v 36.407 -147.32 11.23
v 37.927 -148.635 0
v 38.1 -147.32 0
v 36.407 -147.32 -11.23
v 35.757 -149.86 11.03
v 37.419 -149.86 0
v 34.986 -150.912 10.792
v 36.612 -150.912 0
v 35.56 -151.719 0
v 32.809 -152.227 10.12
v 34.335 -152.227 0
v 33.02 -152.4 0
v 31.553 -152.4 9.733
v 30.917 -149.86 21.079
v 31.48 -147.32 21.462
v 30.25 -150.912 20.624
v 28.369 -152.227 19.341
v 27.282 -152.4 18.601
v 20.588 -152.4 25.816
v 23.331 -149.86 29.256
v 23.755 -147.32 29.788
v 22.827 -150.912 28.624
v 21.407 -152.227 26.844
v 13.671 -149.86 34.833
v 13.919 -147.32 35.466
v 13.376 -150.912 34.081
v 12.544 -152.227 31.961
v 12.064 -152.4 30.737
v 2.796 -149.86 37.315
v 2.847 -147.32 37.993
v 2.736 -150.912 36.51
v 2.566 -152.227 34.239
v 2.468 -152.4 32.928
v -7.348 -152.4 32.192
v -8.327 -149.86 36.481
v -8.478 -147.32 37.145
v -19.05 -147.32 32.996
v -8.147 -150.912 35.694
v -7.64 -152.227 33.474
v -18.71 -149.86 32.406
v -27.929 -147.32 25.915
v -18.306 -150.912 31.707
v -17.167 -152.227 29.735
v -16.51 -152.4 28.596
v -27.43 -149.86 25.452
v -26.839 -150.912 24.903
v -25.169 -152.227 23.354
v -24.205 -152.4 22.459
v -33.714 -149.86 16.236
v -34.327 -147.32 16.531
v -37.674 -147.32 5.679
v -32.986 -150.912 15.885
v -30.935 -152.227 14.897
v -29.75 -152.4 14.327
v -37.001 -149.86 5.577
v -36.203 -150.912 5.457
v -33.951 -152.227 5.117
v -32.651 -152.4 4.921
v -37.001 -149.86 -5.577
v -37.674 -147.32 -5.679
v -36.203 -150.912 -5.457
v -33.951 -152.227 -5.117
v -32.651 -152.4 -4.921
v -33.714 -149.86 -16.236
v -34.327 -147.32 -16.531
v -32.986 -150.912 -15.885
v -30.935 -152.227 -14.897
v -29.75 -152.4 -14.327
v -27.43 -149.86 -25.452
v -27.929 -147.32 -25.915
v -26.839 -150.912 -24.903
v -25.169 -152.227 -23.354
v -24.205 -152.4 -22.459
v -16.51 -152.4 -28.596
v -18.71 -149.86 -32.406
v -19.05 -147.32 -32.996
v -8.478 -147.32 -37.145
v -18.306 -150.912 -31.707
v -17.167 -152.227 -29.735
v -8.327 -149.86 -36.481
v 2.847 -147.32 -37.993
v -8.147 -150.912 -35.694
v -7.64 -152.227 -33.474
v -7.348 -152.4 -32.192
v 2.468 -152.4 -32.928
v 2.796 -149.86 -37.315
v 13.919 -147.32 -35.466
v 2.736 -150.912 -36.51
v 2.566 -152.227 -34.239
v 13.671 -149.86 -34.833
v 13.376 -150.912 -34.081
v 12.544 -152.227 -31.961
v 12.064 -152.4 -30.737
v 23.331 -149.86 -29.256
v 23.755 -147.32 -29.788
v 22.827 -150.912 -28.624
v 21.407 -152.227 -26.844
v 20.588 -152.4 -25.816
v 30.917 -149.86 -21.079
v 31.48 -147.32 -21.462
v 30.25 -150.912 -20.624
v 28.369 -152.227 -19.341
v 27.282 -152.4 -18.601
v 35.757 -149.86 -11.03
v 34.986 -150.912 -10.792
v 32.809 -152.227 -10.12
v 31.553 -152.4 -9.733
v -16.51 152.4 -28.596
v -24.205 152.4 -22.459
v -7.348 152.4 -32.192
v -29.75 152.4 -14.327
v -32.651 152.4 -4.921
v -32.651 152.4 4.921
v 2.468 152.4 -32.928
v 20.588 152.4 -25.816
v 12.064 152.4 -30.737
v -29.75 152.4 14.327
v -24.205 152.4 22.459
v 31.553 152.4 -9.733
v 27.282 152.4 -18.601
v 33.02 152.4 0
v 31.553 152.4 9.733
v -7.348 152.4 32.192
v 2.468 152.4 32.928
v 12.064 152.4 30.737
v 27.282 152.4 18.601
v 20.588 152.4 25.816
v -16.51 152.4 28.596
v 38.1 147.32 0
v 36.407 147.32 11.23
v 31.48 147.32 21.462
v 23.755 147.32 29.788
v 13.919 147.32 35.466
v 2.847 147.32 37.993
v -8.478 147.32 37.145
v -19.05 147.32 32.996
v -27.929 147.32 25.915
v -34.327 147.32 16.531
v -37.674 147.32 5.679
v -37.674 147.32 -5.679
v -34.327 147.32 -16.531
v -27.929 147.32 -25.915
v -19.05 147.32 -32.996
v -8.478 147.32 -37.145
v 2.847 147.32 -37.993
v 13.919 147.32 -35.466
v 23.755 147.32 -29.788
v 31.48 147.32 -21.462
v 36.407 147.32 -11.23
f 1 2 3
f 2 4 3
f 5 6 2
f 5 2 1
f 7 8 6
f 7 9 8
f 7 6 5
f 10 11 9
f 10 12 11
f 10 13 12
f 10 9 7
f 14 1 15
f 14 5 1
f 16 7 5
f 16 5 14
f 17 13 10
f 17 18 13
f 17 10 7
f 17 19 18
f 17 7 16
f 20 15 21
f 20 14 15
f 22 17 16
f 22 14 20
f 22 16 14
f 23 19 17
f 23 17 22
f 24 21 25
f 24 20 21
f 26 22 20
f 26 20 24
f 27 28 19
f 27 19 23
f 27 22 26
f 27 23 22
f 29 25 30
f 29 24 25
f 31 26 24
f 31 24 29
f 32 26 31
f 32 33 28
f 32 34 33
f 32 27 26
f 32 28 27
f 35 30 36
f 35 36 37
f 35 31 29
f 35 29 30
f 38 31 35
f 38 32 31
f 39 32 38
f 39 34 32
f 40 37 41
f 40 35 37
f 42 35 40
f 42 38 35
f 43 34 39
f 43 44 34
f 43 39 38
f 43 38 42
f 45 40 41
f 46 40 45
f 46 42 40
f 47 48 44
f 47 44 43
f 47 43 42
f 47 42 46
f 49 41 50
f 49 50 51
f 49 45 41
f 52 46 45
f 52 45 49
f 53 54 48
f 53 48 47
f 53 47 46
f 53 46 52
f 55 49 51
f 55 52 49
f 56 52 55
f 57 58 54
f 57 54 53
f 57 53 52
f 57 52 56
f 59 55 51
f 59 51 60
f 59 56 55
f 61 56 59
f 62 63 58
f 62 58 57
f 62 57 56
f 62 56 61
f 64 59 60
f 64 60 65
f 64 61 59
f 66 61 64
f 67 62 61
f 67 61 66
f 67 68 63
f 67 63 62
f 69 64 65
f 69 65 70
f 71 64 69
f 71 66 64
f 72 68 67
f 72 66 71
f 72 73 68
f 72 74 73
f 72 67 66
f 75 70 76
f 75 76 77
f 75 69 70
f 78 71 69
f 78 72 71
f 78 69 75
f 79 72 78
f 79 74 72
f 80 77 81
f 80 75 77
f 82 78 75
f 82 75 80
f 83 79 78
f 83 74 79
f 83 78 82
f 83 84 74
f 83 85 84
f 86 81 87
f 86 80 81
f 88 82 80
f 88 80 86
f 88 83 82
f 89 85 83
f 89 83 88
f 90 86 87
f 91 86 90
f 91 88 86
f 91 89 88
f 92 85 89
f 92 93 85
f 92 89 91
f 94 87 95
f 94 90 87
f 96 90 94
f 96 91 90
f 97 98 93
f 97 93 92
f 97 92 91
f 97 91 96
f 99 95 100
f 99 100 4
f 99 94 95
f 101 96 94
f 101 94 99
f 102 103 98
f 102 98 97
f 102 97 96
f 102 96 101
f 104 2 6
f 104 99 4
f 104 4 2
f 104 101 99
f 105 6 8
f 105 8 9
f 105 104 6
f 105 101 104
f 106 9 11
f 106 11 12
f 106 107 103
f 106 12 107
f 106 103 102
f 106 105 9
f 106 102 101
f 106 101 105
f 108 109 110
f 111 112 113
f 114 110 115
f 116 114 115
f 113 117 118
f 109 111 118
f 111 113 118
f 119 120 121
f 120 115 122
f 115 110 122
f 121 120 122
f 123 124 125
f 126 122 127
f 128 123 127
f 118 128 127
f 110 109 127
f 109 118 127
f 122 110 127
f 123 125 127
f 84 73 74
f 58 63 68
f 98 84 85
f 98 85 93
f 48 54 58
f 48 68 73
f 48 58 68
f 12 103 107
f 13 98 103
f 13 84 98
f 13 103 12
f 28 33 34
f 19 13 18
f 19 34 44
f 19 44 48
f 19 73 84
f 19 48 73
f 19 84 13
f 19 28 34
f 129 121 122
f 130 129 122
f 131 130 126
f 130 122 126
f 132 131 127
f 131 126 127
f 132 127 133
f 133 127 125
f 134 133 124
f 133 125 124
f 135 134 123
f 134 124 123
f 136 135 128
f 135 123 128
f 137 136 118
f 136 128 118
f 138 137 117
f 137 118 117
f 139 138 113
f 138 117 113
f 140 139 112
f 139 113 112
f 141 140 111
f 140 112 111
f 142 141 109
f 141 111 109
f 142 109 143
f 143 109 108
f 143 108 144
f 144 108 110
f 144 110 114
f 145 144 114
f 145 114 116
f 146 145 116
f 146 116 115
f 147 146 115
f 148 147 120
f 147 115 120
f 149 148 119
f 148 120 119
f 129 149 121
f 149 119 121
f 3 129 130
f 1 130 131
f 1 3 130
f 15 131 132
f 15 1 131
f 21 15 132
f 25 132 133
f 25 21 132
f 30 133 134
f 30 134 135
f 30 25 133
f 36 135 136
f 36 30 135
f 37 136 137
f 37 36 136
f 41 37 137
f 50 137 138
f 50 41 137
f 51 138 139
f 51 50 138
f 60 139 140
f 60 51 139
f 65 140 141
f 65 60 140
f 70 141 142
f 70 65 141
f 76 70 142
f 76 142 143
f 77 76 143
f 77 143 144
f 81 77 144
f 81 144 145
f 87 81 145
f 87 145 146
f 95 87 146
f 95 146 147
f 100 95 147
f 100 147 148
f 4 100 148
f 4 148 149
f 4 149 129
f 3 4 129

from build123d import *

# Parameters (mm, degrees)
F0_R     = 38.1
F1_DEPTH = 152.4
F2_R     = 5.08
F3_SIZE  = 5.08


with BuildPart() as f1:
    # F0 (on Front) → F1 (new body, symmetric)
    with BuildSketch(Plane.XZ):
        Circle(F0_R)
    extrude(amount=F1_DEPTH, both=True)

    # F2
    f2_edges = [f1.edges().sort_by_distance(p)[0] for p in [
        (-38.1, -152.4, 0),
    ]]
    fillet(f2_edges, radius=F2_R)

    # F3
    f3_edges = [f1.edges().sort_by_distance(p)[0] for p in [
        (38.1, 2.54, 0),
        (-38.1, -147.32, 0),
        (-38.1, 152.4, 0),
    ]]
    chamfer(f3_edges, length=F3_SIZE)


solid = f1.part
